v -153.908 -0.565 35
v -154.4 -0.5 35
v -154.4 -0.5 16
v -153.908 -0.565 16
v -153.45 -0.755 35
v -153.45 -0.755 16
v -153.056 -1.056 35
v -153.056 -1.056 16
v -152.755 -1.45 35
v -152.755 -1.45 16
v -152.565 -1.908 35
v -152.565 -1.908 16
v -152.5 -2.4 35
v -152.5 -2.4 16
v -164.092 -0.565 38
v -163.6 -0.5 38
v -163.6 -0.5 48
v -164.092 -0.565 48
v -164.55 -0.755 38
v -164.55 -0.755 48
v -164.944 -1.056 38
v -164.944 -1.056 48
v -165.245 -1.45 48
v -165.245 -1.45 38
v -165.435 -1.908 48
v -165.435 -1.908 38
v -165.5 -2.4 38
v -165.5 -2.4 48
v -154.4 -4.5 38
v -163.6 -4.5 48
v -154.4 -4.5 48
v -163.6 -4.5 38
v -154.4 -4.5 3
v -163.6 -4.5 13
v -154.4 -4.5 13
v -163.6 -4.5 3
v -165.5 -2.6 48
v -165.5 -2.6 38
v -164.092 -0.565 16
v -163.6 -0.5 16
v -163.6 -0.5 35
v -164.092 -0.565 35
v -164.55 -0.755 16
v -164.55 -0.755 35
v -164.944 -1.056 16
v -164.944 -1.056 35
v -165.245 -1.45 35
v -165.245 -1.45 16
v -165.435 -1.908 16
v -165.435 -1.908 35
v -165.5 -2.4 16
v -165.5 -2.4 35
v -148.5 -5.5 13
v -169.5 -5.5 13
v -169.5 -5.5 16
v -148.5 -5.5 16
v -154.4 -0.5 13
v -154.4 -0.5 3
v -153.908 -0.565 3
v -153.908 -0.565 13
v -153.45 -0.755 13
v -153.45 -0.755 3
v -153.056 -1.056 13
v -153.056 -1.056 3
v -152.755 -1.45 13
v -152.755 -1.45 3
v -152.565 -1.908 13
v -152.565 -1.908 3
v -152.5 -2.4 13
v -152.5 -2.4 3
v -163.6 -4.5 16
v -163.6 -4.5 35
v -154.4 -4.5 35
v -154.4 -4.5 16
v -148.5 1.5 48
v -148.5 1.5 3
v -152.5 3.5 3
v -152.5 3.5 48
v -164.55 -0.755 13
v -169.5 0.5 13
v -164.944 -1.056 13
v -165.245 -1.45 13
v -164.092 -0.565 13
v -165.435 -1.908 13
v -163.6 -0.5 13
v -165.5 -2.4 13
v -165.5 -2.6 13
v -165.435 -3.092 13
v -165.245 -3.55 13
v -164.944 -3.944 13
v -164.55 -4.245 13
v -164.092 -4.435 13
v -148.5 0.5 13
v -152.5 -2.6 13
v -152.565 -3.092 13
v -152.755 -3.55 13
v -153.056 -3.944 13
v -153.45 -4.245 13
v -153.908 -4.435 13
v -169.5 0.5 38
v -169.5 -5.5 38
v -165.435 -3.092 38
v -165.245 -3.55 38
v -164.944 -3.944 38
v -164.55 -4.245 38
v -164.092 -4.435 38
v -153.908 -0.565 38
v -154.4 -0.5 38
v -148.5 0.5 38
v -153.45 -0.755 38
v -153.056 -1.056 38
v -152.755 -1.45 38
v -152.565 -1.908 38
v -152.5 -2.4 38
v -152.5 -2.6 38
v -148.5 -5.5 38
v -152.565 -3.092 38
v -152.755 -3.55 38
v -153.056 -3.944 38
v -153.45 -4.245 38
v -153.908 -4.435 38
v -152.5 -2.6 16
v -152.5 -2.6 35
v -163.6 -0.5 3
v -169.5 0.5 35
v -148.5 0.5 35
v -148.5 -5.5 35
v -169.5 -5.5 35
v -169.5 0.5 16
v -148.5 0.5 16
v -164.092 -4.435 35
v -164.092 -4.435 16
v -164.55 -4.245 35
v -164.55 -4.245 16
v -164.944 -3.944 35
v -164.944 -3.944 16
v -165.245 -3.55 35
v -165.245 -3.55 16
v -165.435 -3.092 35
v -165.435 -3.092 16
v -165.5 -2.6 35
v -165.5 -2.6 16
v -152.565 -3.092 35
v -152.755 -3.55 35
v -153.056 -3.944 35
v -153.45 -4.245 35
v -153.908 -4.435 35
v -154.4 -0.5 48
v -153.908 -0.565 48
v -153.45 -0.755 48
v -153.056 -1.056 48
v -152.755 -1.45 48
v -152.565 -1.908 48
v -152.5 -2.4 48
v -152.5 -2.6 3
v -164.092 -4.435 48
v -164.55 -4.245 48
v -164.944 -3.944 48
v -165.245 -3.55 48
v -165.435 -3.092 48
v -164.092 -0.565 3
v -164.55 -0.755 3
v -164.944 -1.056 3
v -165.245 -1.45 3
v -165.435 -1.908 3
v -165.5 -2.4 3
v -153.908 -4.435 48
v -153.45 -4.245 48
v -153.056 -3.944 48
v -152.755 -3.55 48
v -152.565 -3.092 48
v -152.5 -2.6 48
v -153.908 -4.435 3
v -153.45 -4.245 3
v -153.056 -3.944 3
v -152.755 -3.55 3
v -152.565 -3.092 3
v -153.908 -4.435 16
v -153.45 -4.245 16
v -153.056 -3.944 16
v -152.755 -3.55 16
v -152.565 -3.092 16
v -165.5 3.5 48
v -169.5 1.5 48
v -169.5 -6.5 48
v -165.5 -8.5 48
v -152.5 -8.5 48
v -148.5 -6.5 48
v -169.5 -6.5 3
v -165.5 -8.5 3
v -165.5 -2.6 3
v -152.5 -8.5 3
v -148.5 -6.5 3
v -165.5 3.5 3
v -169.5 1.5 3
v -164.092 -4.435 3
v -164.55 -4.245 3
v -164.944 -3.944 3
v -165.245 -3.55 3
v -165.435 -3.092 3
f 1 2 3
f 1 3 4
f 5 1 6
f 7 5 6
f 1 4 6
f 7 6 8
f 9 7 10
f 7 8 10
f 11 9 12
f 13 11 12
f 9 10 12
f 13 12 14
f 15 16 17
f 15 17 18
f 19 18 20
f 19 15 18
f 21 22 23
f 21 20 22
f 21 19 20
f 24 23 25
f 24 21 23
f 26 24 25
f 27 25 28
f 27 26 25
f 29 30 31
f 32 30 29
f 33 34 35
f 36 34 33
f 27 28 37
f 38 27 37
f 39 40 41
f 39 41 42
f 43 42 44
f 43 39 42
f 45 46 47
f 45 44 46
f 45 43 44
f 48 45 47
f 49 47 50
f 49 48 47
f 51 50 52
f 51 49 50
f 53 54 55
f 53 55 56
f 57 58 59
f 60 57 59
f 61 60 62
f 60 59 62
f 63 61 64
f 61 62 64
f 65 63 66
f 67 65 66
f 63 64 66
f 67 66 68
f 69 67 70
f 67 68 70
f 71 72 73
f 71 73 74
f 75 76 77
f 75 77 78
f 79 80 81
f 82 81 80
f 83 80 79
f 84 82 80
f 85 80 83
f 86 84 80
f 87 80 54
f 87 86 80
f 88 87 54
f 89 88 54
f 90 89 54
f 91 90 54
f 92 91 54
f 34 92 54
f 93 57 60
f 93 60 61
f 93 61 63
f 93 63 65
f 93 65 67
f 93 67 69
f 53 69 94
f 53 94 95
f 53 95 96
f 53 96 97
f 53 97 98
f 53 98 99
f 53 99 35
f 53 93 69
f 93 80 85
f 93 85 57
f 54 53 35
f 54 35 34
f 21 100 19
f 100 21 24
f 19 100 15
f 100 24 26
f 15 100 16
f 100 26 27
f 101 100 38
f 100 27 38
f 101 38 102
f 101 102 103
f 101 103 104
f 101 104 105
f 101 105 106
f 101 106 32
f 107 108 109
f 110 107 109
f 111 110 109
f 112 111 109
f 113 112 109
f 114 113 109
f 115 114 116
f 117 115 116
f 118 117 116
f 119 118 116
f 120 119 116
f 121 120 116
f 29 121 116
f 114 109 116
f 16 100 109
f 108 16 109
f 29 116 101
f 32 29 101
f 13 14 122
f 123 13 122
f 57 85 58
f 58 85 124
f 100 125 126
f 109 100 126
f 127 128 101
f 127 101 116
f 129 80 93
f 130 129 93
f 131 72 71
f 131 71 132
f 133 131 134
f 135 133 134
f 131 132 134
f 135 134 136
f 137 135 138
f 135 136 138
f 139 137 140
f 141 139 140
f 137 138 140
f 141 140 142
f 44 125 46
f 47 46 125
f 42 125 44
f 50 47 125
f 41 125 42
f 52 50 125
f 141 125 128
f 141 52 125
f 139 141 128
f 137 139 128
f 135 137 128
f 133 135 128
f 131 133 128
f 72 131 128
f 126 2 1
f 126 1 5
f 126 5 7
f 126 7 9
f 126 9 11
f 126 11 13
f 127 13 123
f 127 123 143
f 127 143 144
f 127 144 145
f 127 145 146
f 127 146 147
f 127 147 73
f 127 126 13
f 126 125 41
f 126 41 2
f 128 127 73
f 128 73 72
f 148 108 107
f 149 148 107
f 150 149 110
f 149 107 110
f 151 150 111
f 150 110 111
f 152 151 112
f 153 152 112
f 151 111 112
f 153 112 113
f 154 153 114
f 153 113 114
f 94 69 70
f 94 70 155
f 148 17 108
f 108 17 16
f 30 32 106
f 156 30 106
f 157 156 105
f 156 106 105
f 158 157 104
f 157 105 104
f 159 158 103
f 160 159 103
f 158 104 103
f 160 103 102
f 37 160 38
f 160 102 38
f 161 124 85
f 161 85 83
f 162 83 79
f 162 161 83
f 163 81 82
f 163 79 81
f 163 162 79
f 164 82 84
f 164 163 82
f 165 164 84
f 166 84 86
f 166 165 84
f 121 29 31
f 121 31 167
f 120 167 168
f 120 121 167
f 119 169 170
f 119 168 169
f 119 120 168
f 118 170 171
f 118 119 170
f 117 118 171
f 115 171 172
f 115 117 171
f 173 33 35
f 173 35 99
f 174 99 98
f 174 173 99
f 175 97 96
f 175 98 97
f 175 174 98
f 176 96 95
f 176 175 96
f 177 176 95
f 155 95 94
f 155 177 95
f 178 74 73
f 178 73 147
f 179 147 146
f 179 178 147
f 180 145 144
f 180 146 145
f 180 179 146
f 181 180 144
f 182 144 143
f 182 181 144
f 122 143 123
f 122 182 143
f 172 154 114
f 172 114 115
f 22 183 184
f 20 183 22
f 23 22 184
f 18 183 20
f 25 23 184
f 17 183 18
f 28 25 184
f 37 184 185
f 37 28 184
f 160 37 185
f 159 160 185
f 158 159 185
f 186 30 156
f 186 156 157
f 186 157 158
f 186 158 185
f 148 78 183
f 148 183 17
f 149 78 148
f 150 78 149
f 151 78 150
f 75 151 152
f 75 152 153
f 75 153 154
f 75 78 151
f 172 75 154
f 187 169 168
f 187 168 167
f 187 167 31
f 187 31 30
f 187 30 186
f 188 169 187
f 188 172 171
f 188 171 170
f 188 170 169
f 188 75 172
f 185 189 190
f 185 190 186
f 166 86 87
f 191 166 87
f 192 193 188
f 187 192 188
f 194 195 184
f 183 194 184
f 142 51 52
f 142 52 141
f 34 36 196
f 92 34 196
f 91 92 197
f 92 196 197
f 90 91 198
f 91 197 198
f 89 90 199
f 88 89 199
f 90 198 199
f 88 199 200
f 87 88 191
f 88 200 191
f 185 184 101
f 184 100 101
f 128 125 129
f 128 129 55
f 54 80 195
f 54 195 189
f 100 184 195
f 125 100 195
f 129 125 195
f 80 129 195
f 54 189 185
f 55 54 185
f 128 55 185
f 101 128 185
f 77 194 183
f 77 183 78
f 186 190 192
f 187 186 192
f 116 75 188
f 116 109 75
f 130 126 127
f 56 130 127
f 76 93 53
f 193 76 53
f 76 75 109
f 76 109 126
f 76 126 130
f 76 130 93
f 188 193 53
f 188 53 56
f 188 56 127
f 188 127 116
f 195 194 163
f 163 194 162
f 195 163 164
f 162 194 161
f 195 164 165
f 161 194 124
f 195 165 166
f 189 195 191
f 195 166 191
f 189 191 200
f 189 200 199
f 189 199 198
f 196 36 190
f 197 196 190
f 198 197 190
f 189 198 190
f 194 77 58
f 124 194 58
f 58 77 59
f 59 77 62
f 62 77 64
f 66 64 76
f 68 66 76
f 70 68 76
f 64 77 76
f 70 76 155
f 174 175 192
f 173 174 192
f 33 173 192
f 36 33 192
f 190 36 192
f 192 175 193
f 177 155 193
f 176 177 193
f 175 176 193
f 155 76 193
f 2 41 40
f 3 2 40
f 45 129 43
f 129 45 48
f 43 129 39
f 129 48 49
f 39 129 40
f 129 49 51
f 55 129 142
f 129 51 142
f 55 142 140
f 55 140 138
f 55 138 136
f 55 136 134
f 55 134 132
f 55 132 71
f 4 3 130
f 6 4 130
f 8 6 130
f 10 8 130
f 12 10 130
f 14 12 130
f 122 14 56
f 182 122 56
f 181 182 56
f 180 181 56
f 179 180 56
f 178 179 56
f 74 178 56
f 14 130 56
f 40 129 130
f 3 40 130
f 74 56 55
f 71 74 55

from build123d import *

# Parameters (mm, degrees)
BOX166_W               = 6
BOX166_H               = 26
BOX166_DEPTH           = 3
BOX165_W               = 4
BOX165_H               = 53
BOX165_DEPTH           = 13
FILLET020_R            = 1.9
BOX164_W               = 6
BOX164_H               = 26
BOX164_DEPTH           = 3
BOX163_W               = 12
BOX163_H               = 21
BOX163_DEPTH           = 45
CHAMFER064_1_SIZE2     = 2
CHAMFER064_1_SIZE      = 4
CHAMFER064_2_SIZE2     = 2
CHAMFER064_2_SIZE      = 4
CUT060_PLACEMENT_ANGLE = 90


with BuildPart() as cube166:
    # Box166 → Box166 (new body)
    with BuildSketch(Plane(origin=(2, -2.5, 35), x_dir=(1, 0, 0), z_dir=(0, 0, 1))):
        with Locations((3, 13)):
            Rectangle(BOX166_W, BOX166_H)
    extrude(amount=BOX166_DEPTH)


with BuildPart() as fillet020:
    # Box165 → Box165 (new body)
    with BuildSketch(Plane(origin=(3, 4, 50), x_dir=(1, 0, 0), z_dir=(0, 1, 0))):
        with Locations((2, 26.5)):
            Rectangle(BOX165_W, BOX165_H)
    extrude(amount=BOX165_DEPTH)

    # Fillet020
    fillet020_edges = [fillet020.edges().sort_by_distance(p)[0] for p in [
        (3, 17, 23.5),
        (3, 4, 23.5),
        (7, 17, 23.5),
        (7, 4, 23.5),
    ]]
    fillet(fillet020_edges, radius=FILLET020_R)


with BuildPart() as fusion086:
    # Box164 → Box164 (new body)
    with BuildSketch(Plane(origin=(2, -2.5, 13), x_dir=(1, 0, 0), z_dir=(0, 0, 1))):
        with Locations((3, 13)):
            Rectangle(BOX164_W, BOX164_H)
    extrude(amount=BOX164_DEPTH)

    # Fusion086: union Cube166, Fillet020
    add(cube166.part)
    add(fillet020.part)


with BuildPart() as sloupek:
    # Box163 → Box163 (new body)
    with BuildSketch(Plane(origin=(-1, 0, 3), x_dir=(1, 0, 0), z_dir=(0, 0, 1))):
        with Locations((6, 10.5)):
            Rectangle(BOX163_W, BOX163_H)
    extrude(amount=BOX163_DEPTH)

    # Chamfer064 1
    chamfer064_1_edges = [sloupek.edges().sort_by_distance(p)[0] for p in [
        (11, 0, 25.5),
        (11, 21, 25.5),
    ]]
    chamfer064_1_side = sloupek.faces().sort_by_distance((11, 10.5, 25.5))[0]
    chamfer(chamfer064_1_edges, length=CHAMFER064_1_SIZE, length2=CHAMFER064_1_SIZE2, reference=chamfer064_1_side)

    # Chamfer064 2
    chamfer064_2_edges = [sloupek.edges().sort_by_distance(p)[0] for p in [
        (-1, 0, 25.5),
        (-1, 21, 25.5),
    ]]
    chamfer064_2_side = sloupek.faces().sort_by_distance((-1, 10.5, 25.5))[0]
    chamfer(chamfer064_2_edges, length=CHAMFER064_2_SIZE, length2=CHAMFER064_2_SIZE2, reference=chamfer064_2_side)

    # Cut060: cut Fusion086
    add(fusion086.part, mode=Mode.SUBTRACT)


with BuildPart() as sloupek_1:
    # Cut060 placement: moved
    add(sloupek.part.moved(Location((-169.5, 2.5, 0))).rotate(Axis((-169.5, 2.5, 0), (0, 0, -1)), CUT060_PLACEMENT_ANGLE))


solid = sloupek_1.part
